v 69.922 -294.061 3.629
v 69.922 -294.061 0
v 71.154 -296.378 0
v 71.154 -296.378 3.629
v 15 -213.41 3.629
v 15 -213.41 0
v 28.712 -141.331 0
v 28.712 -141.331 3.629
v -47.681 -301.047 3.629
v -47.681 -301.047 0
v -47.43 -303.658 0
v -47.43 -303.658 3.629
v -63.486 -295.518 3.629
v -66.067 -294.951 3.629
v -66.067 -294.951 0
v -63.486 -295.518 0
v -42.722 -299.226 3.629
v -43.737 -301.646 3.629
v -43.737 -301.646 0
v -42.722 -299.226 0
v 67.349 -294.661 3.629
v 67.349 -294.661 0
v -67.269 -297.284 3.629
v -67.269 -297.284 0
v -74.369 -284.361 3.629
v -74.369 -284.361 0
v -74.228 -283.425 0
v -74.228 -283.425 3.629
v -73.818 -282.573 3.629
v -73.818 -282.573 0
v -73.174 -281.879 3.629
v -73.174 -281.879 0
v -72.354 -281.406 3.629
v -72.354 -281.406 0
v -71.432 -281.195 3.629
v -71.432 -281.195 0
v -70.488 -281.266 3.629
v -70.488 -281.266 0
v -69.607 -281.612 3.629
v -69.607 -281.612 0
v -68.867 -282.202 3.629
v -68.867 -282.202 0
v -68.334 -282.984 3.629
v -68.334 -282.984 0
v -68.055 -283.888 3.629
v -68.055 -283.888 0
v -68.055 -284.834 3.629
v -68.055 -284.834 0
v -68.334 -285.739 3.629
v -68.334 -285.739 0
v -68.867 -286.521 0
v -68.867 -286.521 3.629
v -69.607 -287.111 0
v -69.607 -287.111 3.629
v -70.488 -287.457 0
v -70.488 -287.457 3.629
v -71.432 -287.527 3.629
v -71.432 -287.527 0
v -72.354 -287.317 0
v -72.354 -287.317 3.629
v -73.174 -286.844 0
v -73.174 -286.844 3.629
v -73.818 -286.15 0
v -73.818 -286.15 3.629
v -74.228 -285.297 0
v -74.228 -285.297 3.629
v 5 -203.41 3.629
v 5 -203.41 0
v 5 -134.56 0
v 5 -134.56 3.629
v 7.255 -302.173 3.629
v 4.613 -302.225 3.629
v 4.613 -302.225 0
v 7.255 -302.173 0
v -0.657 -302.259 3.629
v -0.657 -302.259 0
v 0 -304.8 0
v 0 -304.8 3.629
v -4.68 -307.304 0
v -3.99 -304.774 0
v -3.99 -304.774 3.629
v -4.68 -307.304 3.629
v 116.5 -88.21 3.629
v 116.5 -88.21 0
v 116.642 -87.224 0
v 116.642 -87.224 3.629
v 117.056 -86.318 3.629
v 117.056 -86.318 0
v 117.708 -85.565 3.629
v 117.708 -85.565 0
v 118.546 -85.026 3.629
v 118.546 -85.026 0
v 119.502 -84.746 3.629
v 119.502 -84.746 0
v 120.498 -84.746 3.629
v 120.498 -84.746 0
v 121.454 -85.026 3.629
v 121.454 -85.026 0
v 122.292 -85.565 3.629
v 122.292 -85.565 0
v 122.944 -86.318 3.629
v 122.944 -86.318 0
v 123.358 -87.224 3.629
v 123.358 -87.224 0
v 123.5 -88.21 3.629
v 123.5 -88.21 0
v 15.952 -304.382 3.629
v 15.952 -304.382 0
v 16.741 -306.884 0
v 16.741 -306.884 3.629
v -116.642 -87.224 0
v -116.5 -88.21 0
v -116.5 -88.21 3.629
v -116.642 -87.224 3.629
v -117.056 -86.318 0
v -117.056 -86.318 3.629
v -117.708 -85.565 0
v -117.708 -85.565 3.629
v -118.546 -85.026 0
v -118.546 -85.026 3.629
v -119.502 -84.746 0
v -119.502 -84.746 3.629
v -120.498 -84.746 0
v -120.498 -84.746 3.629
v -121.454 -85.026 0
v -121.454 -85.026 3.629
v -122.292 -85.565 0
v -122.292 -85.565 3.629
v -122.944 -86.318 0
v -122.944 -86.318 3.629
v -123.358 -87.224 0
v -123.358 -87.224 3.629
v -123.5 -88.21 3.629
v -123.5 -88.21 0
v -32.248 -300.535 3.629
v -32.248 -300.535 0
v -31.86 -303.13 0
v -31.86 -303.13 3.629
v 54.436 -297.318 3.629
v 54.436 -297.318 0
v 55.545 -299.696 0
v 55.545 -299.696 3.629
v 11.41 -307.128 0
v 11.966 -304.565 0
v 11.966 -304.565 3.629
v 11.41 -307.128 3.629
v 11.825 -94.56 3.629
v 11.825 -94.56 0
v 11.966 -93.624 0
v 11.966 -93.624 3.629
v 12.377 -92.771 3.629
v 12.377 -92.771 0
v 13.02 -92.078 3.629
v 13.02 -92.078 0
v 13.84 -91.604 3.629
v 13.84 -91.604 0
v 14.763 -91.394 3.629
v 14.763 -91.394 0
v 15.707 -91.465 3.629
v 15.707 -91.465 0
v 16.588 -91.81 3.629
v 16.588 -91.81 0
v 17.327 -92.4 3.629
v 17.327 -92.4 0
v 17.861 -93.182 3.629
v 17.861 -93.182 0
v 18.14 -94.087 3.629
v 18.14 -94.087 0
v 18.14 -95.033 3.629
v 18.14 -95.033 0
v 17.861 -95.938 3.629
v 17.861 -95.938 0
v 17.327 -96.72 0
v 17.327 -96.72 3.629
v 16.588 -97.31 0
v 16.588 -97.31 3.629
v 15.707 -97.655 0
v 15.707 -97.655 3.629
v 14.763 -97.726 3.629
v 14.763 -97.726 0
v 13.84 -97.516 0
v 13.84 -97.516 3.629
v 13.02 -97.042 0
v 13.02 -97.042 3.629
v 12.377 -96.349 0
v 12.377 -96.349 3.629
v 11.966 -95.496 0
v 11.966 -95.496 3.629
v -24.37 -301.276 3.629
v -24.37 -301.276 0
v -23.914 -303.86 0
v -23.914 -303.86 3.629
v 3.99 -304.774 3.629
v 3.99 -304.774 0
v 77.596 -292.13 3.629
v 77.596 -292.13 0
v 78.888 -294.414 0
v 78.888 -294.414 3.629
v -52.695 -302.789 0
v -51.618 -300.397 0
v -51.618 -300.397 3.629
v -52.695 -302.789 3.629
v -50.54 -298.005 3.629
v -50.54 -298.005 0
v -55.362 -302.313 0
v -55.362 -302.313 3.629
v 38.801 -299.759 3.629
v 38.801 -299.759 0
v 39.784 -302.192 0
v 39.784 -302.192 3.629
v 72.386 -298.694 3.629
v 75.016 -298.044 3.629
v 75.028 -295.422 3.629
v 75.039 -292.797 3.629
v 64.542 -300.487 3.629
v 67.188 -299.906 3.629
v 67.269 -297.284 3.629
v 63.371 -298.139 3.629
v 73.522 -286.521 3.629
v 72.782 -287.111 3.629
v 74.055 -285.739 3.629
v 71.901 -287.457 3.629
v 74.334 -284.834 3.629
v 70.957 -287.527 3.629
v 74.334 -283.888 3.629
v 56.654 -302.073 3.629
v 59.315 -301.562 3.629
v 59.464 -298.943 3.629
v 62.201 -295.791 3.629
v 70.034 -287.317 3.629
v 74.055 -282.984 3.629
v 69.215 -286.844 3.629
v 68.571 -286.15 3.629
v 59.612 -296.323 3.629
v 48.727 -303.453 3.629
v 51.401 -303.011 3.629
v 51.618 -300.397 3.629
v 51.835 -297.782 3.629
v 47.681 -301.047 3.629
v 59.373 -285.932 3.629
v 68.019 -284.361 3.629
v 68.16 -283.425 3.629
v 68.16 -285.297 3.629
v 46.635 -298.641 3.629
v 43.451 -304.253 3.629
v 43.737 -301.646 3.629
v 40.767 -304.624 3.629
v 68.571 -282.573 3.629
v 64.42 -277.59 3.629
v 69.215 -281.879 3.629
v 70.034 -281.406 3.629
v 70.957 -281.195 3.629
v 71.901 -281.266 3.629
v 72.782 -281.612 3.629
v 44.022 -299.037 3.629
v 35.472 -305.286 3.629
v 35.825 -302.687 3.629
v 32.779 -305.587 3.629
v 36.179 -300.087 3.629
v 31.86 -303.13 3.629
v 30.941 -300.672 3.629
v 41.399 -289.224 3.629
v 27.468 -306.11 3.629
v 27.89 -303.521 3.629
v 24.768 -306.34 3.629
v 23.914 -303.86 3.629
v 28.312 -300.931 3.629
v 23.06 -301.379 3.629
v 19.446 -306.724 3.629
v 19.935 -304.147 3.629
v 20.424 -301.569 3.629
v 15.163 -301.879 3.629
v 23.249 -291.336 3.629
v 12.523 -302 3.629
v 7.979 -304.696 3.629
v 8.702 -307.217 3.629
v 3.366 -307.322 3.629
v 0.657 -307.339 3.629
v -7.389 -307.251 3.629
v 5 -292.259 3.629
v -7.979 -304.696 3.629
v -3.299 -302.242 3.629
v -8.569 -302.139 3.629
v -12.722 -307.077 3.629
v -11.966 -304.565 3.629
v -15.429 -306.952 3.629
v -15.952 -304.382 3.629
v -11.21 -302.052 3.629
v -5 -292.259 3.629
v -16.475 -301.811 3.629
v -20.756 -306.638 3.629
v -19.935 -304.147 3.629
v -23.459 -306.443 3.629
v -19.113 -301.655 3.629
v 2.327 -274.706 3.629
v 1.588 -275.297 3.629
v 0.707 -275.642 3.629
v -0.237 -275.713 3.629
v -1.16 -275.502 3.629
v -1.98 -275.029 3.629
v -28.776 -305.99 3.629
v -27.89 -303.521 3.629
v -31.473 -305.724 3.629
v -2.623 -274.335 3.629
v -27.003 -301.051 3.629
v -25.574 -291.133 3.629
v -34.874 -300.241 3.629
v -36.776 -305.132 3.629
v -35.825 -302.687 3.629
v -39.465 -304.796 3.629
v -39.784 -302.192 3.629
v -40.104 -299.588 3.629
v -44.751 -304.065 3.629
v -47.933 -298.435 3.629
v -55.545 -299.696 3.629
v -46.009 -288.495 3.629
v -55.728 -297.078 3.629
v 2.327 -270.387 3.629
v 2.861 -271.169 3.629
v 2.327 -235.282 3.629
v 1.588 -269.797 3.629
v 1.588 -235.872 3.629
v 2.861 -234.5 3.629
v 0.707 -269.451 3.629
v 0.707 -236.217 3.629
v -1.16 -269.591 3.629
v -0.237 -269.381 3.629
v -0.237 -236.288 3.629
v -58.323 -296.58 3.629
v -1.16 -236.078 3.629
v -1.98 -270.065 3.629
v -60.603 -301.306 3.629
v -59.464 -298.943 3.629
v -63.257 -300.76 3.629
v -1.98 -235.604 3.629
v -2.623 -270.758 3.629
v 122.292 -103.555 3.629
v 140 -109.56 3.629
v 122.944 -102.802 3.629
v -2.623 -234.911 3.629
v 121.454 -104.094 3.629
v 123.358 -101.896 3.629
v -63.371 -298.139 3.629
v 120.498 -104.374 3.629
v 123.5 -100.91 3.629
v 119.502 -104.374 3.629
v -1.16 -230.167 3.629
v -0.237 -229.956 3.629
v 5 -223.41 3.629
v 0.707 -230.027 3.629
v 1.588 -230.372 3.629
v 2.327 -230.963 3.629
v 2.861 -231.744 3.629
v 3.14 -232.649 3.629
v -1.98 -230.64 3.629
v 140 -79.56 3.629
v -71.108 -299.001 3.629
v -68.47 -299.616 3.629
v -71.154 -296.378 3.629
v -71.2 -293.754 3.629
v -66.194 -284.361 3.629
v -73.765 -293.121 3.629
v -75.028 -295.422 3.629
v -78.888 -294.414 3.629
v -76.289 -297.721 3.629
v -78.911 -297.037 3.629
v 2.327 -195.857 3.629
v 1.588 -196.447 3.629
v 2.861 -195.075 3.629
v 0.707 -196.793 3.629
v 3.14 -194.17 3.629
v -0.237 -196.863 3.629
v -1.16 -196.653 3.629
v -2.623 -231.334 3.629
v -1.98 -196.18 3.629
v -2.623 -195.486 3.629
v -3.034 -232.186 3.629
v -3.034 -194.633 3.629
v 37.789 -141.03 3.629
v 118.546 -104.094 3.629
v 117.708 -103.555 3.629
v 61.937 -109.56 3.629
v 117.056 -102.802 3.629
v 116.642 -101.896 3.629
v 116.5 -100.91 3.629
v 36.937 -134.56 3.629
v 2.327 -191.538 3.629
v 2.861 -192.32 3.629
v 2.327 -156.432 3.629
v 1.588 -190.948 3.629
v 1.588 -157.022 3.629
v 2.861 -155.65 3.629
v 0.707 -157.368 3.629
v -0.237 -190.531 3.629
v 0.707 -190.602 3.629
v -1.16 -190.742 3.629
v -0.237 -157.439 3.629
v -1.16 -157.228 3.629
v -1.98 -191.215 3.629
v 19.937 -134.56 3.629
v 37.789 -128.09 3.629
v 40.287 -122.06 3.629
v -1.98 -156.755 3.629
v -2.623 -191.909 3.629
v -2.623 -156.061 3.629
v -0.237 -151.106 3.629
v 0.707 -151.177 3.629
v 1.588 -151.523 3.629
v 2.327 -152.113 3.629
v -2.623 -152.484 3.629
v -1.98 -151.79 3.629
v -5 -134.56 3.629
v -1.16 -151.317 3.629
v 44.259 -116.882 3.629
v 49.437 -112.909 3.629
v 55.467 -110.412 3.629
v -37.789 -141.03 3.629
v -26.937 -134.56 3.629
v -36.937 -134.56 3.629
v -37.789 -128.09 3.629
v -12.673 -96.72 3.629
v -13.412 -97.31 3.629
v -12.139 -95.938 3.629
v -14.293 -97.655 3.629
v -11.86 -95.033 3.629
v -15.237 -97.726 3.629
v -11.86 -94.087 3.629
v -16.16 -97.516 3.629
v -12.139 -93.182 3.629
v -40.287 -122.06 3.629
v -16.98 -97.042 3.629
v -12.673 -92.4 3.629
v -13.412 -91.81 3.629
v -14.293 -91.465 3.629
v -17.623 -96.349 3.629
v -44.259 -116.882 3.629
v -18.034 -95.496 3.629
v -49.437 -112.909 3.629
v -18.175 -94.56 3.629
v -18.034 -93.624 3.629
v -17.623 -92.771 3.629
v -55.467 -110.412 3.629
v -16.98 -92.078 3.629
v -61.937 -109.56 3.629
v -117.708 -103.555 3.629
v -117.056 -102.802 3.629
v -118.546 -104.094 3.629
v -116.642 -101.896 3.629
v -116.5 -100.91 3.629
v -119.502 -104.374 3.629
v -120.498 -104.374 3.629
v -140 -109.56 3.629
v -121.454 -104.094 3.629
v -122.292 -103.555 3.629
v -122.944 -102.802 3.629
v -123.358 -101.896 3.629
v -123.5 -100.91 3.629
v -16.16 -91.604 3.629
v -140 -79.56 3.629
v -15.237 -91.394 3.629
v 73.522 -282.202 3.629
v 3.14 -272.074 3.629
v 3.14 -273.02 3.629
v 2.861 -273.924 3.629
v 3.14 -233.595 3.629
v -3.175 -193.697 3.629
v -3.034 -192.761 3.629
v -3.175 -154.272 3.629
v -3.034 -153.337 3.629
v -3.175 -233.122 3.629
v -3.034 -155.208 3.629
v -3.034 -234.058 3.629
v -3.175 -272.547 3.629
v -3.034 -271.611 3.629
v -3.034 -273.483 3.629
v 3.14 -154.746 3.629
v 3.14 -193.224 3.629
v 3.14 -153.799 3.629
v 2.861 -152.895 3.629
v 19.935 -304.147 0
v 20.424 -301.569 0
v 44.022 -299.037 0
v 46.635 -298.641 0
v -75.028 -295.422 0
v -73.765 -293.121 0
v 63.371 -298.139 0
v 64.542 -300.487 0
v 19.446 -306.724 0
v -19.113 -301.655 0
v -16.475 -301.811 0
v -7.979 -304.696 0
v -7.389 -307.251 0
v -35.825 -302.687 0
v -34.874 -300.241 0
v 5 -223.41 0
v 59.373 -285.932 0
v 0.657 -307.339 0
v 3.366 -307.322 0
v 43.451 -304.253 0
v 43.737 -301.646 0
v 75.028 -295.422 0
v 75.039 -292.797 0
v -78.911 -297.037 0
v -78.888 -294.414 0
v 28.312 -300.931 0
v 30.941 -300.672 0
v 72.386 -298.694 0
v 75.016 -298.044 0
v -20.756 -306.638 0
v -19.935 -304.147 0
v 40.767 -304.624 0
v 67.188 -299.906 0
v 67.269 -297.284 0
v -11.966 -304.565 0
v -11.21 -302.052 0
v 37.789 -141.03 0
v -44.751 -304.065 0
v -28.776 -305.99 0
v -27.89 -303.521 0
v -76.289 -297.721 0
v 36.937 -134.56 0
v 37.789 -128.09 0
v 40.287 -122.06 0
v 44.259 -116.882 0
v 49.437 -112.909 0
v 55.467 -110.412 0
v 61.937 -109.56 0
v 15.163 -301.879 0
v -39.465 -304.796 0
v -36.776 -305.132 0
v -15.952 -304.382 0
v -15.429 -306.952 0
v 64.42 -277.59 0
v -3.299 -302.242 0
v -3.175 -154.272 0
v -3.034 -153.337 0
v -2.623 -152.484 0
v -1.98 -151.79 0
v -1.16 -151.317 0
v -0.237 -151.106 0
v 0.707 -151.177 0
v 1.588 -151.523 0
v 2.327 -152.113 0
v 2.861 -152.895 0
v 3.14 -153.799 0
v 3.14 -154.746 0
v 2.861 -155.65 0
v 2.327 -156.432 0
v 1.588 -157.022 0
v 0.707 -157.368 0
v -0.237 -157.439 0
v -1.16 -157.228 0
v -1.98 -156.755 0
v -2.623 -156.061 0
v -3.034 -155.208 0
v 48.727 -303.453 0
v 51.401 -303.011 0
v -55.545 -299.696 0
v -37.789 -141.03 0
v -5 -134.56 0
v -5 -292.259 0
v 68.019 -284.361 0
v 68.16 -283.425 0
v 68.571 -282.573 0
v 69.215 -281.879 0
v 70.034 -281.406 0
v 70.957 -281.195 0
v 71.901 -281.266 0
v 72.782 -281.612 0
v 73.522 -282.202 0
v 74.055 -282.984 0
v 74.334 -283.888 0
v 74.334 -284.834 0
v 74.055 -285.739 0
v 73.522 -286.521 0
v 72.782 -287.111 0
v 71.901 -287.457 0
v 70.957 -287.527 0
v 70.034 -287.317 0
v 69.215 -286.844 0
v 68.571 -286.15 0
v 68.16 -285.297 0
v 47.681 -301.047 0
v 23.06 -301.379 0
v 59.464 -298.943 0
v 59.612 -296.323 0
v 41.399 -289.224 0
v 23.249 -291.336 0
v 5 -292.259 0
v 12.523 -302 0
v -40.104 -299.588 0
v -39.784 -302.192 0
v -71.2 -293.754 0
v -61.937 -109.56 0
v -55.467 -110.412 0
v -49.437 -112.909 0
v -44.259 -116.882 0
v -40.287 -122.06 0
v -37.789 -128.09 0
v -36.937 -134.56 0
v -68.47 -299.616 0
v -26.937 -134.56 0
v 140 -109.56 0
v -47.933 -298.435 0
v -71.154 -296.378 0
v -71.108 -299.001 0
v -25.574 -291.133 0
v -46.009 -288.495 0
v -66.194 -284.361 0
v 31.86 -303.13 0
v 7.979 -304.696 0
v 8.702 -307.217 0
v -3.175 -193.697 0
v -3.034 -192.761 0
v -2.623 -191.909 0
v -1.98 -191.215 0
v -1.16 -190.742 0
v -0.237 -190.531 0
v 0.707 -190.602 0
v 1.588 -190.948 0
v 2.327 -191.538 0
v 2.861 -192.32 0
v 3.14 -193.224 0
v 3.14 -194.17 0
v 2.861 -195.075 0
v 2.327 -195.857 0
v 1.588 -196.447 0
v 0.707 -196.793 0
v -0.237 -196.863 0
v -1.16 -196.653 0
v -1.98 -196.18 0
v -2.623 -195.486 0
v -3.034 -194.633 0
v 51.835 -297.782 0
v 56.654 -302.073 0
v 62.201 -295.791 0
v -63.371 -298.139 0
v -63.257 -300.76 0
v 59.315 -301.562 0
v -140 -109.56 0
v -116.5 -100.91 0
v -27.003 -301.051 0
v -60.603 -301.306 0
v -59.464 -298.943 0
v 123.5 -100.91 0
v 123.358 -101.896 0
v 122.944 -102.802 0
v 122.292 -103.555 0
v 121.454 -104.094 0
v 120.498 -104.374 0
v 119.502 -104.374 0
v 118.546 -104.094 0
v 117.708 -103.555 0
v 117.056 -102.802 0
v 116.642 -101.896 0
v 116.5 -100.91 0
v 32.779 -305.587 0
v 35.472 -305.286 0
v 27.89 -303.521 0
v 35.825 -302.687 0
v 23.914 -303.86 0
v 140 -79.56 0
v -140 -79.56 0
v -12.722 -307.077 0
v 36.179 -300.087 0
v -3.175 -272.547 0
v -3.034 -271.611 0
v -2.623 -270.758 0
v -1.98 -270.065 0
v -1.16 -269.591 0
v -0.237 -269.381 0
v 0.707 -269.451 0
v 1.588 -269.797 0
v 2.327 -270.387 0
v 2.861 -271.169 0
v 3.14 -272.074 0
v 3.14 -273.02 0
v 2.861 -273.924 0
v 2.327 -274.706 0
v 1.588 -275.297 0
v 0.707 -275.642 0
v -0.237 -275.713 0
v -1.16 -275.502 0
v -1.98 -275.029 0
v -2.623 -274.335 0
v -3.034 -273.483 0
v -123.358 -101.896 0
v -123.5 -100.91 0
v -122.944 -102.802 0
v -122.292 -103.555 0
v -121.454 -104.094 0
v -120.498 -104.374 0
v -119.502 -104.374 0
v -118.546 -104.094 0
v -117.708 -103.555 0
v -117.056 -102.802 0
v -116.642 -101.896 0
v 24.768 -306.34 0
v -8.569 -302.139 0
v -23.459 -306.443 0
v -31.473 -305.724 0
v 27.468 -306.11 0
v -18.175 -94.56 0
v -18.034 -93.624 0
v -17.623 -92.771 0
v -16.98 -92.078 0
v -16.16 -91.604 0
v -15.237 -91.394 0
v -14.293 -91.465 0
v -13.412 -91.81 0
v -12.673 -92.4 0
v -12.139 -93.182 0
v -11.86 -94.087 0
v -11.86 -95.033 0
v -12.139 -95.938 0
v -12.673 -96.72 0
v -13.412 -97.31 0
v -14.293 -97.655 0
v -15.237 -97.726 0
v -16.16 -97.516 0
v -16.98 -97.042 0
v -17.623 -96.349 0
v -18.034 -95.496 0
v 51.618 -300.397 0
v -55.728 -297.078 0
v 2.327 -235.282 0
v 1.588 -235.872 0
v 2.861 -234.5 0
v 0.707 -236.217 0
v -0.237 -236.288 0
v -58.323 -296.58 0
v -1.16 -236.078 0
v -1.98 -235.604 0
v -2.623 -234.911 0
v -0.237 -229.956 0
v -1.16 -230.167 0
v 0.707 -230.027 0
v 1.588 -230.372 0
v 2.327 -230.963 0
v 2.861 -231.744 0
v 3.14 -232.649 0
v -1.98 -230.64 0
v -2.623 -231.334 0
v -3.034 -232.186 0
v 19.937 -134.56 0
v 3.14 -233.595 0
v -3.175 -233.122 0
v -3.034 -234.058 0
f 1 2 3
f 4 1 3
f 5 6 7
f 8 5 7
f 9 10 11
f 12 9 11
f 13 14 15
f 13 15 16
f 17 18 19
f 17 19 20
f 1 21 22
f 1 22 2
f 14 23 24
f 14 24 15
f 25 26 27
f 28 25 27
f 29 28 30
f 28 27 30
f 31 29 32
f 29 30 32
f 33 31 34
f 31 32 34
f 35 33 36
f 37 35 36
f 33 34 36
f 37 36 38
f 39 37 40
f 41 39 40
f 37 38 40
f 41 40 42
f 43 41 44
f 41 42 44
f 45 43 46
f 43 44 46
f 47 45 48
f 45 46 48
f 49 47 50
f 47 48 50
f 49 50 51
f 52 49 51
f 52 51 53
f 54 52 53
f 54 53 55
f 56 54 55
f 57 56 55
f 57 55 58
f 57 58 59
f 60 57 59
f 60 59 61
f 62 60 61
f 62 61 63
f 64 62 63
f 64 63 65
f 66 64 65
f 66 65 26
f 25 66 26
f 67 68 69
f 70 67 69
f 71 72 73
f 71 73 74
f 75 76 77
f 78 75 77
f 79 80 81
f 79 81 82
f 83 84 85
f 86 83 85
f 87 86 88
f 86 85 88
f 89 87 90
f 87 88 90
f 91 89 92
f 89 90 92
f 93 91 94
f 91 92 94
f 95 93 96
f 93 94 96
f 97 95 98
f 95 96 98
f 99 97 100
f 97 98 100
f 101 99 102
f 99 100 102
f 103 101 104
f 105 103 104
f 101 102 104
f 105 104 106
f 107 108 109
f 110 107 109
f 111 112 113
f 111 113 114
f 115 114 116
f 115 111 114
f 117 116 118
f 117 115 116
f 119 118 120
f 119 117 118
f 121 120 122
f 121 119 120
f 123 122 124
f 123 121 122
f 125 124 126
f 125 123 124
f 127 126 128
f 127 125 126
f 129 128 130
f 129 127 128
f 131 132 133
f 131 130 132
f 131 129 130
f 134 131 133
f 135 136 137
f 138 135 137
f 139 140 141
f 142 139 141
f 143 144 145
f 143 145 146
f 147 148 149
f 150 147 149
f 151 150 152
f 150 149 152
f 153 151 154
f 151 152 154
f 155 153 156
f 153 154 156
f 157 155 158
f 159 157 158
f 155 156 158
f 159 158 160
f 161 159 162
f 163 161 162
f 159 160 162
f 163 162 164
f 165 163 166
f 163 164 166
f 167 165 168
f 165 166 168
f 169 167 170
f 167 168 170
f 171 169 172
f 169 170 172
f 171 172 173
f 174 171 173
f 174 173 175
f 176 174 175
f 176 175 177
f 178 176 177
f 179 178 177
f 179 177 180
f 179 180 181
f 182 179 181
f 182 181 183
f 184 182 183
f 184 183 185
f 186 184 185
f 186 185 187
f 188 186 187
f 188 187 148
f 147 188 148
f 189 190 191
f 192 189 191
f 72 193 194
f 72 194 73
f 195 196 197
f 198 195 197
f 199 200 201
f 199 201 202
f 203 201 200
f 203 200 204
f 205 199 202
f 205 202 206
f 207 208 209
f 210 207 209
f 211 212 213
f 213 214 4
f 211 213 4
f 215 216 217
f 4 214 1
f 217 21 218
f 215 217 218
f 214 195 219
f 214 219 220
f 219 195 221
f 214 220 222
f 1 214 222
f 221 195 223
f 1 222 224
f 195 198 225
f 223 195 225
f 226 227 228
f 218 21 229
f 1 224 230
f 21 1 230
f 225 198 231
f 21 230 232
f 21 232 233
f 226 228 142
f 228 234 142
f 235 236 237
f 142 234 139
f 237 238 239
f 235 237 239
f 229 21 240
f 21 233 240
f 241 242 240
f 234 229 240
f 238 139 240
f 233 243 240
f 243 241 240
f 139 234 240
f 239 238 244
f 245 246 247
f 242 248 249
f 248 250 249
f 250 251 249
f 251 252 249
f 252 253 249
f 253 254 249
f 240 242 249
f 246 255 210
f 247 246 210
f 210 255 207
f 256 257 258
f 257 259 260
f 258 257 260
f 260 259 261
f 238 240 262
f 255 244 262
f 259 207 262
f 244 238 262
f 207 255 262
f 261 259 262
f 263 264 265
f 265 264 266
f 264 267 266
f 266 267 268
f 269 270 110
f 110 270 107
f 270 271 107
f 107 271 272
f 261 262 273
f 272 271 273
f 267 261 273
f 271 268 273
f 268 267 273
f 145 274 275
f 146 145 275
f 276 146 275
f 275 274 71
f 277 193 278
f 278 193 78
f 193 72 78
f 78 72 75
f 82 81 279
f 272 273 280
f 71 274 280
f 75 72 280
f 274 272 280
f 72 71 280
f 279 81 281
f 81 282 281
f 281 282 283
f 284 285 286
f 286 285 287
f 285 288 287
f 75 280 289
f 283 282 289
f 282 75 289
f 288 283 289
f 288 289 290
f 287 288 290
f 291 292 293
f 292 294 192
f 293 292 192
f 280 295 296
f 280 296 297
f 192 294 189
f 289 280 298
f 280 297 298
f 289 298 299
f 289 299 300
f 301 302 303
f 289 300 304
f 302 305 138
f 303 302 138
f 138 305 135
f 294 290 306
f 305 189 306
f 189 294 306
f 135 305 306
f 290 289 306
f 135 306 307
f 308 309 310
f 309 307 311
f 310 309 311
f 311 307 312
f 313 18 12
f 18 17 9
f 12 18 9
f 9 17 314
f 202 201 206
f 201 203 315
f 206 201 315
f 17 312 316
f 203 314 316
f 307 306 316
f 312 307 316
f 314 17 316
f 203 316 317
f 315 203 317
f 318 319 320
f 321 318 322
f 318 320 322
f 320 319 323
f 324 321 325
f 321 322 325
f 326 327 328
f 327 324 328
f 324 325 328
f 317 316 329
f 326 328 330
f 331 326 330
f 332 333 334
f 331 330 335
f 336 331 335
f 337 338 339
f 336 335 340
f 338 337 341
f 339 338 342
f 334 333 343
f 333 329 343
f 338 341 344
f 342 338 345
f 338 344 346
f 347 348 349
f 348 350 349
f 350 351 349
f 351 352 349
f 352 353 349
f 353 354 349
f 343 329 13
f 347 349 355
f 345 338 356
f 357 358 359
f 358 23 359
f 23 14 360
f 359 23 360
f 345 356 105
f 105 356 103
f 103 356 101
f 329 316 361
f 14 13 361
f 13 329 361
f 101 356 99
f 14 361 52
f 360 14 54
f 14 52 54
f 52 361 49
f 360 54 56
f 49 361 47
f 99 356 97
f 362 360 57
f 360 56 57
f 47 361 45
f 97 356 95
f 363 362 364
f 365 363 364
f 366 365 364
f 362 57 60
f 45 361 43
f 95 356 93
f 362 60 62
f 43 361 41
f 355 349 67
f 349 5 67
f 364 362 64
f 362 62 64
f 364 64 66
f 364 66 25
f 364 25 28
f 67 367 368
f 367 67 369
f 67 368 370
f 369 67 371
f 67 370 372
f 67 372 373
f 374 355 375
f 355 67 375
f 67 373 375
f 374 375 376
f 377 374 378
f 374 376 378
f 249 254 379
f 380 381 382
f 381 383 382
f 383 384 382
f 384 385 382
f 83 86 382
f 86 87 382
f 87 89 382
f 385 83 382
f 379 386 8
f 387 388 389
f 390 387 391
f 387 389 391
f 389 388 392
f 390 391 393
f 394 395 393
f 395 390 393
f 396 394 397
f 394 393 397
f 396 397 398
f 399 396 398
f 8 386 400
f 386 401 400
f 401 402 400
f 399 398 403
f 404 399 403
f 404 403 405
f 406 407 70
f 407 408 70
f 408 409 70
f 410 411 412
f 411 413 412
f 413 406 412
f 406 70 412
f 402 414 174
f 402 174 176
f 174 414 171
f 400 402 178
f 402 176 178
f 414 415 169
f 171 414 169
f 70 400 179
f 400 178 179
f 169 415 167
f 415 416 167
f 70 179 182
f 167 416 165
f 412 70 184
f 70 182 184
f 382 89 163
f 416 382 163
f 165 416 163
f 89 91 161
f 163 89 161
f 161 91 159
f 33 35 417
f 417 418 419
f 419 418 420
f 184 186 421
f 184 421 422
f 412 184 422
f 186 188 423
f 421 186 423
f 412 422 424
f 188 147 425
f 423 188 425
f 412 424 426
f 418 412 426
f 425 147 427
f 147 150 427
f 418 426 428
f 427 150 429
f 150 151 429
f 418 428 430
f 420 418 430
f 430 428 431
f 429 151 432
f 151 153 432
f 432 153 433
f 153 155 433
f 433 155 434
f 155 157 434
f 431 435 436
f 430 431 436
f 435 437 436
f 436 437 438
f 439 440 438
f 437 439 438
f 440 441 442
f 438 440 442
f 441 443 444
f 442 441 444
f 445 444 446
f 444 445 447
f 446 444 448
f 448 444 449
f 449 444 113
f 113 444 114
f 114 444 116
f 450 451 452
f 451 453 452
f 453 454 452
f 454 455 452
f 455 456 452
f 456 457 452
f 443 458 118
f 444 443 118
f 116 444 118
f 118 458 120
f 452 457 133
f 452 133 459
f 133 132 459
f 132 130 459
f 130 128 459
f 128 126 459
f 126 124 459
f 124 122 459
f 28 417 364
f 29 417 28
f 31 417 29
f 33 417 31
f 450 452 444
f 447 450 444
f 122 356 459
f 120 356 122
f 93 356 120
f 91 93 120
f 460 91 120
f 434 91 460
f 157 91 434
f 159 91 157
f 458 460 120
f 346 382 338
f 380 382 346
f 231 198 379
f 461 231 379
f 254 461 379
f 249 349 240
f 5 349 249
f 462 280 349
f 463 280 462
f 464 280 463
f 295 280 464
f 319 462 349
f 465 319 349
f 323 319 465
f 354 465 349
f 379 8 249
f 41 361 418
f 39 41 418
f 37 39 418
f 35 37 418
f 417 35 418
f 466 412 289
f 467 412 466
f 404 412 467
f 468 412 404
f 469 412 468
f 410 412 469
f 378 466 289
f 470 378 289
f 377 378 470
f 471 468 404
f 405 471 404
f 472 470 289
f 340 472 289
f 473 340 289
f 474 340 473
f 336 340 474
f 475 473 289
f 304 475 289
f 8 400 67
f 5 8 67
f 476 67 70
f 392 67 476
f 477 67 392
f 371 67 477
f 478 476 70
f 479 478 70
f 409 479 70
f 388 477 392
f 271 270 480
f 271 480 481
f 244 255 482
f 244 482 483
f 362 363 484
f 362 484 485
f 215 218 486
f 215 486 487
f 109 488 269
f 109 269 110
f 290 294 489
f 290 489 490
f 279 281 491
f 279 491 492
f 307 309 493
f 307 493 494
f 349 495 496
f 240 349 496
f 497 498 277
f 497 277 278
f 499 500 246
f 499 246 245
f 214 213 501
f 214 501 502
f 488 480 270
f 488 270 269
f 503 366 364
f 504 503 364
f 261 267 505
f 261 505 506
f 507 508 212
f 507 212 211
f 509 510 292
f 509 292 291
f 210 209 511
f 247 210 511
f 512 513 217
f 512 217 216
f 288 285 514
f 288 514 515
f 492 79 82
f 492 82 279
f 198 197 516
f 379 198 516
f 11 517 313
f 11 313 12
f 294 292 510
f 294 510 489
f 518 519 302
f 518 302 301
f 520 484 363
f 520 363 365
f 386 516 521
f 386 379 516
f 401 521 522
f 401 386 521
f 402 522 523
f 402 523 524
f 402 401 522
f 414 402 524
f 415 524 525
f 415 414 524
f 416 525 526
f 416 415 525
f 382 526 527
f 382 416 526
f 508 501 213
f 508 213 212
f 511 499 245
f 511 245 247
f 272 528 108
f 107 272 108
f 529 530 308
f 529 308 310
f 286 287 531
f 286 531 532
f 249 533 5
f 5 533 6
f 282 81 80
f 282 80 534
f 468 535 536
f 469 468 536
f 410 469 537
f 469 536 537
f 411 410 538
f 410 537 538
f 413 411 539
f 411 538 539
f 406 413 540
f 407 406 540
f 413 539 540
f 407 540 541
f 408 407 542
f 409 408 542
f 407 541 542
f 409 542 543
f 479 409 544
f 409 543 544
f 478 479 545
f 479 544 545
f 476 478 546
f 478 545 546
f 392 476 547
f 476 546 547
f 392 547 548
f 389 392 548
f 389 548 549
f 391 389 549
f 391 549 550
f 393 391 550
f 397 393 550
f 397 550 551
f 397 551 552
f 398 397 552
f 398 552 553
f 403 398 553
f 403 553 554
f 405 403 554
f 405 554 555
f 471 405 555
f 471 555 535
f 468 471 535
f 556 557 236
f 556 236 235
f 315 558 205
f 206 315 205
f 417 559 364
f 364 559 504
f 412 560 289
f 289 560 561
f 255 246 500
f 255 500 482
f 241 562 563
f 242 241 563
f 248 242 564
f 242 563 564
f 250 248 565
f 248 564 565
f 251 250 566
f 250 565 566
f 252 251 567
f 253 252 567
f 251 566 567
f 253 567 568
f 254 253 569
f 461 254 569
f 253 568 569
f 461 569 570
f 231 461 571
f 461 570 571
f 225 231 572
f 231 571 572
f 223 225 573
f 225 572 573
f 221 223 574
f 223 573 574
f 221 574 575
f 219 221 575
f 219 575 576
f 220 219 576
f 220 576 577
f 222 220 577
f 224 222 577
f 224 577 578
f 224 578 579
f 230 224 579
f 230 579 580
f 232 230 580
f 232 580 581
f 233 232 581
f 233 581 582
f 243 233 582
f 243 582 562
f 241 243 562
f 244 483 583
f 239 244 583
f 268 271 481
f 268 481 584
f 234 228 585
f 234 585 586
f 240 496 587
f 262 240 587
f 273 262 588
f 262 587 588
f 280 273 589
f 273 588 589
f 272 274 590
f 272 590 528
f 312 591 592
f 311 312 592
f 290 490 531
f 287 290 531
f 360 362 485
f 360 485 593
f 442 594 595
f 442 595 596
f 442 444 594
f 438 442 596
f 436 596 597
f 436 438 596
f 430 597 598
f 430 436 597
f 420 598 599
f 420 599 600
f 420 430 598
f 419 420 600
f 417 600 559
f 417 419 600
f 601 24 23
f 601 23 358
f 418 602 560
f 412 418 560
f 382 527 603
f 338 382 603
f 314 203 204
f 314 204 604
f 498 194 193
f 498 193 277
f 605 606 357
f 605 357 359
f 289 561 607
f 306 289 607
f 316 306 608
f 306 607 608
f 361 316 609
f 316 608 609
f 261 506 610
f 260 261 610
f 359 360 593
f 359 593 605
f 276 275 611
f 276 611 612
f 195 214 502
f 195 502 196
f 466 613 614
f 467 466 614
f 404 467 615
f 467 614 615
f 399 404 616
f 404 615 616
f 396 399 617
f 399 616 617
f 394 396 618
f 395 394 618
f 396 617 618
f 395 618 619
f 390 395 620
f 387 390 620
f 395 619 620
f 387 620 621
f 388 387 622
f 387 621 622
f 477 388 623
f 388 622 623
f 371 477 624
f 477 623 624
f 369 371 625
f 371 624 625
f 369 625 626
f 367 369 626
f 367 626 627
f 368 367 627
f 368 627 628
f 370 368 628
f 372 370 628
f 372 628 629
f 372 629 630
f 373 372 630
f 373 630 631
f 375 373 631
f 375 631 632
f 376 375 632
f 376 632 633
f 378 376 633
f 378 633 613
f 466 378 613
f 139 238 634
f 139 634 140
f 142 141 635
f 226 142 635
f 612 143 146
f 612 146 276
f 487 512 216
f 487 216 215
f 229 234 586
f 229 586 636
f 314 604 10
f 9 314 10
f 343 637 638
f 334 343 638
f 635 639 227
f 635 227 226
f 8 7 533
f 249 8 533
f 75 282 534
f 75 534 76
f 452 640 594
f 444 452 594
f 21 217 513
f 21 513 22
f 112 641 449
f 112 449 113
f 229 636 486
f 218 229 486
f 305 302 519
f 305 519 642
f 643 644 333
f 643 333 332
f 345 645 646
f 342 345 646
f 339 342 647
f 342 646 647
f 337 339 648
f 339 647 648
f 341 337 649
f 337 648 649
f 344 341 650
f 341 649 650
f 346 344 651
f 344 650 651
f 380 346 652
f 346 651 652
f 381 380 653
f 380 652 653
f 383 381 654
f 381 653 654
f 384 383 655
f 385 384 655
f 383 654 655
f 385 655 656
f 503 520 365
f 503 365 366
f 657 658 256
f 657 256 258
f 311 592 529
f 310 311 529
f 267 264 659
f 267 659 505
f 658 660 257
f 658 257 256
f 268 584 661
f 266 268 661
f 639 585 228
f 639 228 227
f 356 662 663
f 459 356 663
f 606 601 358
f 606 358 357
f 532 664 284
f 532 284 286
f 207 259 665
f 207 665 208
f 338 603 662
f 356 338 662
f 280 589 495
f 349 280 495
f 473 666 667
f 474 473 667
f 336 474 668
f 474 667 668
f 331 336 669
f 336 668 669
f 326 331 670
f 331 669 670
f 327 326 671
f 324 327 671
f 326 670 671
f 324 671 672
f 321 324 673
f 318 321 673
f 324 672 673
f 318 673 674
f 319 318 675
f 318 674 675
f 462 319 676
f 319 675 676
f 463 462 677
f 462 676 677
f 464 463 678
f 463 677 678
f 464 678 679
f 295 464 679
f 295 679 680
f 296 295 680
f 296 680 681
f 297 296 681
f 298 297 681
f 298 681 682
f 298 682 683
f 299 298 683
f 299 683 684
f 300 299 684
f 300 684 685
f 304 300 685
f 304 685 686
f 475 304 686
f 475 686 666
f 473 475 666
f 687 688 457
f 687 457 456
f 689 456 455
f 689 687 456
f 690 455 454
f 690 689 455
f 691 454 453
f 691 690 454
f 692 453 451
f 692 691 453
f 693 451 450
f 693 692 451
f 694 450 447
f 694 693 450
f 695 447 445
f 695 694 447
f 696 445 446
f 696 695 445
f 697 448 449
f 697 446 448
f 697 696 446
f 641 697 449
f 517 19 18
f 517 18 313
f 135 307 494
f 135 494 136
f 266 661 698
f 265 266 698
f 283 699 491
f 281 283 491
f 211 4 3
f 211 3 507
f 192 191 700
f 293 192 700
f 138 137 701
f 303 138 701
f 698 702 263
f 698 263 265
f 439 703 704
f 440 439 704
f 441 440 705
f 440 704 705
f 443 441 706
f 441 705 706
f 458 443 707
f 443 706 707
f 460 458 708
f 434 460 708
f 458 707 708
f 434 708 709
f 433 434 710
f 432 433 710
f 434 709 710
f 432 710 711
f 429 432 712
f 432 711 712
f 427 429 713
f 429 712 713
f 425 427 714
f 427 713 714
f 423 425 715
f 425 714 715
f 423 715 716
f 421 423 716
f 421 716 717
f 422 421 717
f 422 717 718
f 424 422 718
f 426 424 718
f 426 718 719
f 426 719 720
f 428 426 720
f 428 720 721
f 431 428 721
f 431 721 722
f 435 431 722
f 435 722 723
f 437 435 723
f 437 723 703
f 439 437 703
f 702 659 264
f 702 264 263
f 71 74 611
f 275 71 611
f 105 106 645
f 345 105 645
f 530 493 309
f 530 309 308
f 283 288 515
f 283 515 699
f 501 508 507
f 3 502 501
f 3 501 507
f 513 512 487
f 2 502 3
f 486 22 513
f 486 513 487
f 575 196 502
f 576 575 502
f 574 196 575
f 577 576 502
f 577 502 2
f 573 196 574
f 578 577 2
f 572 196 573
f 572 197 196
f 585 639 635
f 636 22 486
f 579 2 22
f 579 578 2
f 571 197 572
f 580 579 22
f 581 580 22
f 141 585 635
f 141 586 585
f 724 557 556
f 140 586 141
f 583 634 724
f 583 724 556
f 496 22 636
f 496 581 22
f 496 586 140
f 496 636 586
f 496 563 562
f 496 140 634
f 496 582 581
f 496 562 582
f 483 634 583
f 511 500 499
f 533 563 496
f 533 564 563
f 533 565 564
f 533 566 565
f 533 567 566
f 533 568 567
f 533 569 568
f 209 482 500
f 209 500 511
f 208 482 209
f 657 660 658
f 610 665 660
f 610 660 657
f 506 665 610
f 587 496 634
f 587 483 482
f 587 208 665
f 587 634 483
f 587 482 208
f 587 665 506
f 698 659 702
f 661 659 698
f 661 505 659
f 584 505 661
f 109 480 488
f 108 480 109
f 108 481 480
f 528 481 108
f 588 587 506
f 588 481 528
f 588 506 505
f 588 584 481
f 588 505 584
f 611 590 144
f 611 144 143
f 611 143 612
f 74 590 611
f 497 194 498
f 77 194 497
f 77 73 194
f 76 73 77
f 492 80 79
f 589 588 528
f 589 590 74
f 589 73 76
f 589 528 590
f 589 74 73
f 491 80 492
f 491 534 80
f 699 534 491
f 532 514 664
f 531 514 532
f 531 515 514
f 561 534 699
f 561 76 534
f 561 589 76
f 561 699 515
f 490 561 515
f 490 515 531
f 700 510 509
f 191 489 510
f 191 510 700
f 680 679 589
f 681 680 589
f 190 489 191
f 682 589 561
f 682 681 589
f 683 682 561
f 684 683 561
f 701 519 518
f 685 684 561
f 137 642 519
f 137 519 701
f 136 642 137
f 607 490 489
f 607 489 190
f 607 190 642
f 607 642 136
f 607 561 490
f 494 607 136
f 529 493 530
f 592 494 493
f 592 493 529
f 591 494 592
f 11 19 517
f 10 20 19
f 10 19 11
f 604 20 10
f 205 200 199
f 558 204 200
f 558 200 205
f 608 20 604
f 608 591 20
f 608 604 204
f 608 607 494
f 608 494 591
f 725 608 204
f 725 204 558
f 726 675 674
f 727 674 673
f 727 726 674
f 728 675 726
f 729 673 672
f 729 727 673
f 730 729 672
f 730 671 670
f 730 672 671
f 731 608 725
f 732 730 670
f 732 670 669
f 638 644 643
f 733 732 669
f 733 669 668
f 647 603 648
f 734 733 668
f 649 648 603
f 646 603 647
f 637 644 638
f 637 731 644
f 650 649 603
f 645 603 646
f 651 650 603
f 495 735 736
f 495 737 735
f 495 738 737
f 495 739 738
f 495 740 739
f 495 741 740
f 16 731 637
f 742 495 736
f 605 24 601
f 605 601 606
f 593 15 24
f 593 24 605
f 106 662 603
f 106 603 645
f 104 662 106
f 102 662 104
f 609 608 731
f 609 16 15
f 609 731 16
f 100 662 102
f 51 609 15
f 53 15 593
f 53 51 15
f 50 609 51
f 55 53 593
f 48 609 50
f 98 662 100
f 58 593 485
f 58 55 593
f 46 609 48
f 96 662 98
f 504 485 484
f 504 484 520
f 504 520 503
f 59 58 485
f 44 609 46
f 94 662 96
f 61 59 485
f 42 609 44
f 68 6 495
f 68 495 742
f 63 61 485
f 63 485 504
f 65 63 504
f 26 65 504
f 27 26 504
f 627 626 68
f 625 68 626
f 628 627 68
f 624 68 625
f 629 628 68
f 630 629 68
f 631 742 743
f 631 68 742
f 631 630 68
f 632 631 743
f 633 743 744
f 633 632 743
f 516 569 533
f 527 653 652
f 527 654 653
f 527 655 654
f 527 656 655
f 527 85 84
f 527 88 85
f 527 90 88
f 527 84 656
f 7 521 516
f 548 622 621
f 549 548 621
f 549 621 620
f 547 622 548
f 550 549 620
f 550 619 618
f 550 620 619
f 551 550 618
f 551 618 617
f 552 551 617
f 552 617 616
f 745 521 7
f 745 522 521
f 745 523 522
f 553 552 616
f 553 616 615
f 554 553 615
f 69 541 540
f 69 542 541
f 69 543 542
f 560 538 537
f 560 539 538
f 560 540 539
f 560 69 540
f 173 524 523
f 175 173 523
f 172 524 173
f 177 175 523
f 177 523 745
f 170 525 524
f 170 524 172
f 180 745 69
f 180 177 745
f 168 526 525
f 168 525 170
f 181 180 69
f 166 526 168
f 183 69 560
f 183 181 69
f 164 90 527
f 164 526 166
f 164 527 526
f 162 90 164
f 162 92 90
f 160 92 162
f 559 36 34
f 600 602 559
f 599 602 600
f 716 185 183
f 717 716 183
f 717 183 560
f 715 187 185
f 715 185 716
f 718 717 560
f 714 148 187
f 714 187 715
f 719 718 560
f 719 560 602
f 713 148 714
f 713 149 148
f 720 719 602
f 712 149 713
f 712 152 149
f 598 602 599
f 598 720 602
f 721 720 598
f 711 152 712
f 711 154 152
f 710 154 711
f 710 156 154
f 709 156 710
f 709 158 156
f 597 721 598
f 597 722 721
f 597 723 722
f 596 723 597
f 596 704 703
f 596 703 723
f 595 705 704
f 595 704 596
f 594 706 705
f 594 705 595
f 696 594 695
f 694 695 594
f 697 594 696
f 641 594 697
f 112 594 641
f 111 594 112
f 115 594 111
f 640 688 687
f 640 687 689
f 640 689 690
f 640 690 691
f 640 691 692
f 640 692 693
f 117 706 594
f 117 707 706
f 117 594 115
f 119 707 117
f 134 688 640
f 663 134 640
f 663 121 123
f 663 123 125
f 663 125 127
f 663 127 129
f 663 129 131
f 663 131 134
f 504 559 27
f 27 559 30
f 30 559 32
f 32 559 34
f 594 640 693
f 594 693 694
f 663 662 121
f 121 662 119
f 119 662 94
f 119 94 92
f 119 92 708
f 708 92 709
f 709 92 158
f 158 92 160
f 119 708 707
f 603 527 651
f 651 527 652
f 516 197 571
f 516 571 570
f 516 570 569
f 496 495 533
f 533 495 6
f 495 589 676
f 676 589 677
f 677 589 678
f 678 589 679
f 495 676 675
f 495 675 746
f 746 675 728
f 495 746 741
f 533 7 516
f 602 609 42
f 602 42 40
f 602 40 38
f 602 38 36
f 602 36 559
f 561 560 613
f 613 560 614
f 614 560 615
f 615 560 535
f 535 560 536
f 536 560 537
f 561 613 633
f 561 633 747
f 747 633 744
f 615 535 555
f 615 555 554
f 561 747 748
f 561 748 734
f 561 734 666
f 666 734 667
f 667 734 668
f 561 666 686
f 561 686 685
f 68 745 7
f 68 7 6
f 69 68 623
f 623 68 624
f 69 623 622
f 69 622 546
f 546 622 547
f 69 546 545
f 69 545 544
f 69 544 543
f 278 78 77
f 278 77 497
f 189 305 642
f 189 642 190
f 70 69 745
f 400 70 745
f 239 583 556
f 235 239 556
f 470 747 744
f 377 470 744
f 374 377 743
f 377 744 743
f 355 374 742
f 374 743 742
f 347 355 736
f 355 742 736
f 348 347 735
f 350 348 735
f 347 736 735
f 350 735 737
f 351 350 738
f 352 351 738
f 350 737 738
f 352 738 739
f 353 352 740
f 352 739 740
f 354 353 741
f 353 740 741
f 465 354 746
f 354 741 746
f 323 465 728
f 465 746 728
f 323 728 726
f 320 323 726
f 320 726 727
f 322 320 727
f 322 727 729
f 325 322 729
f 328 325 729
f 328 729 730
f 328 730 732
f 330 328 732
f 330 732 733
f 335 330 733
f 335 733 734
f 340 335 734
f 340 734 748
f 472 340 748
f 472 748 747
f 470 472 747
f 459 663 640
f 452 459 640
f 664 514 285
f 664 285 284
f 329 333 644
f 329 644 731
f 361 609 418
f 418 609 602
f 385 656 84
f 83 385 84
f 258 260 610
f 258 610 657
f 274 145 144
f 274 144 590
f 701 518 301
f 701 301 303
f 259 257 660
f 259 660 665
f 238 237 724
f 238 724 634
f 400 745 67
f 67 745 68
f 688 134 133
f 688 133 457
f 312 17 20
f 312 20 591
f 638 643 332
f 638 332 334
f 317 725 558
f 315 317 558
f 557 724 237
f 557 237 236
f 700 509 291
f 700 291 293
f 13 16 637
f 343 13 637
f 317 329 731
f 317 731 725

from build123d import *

# Parameters (mm, degrees)
BOSS_EXTRUDE2_DEPTH = 3.628571429
FILLET1_R           = 25
BOSS_EXTRUDE4_DEPTH = 3.628571429
CUT_EXTRUDE2_DEPTH  = 336.434355024
CIRPATTERN8_COUNT   = 20
CIRPATTERN8_ANGLE   = 28.5
SKETCH5_R           = 3.175
CUT_EXTRUDE3_DEPTH  = 338.743409804
SKETCH17_R          = 3.175
CUT_EXTRUDE4_DEPTH  = 338.743409804


with BuildPart() as part:
    # Sketch3 → Boss-Extrude2 (new body)
    with BuildSketch(Plane.XY):
        with BuildLine():
            Line((-140, -79.56), (-140, -109.56))
            Line((-140, -109.56), (-29.356513523, -109.56))
            Line((-29.356513523, -109.56), (-78.888044947, -294.414191853))
            ThreePointArc((-78.888044947, -294.414191853), (0, -304.8), (78.888044947, -294.414191853))
            Line((78.888044947, -294.414191853), (29.356513523, -109.56))
            Line((29.356513523, -109.56), (140, -109.56))
            Line((140, -109.56), (140, -79.56))
            Line((140, -79.56), (-140, -79.56))
        make_face()
    extrude(amount=BOSS_EXTRUDE2_DEPTH)

    # Fillet1
    fillet1_edges = [part.edges().sort_by_distance(p)[0] for p in [
        (29.356513523, -109.56, 1.814285714),
        (-29.356513523, -109.56, 1.814285714),
    ]]
    fillet(fillet1_edges, radius=FILLET1_R)

    # Sketch14 → Boss-Extrude4 (add)
    with BuildSketch(Plane(origin=(0, 0, 0), x_dir=(-1, 0, 0), z_dir=(0, 0, -1))):
        with BuildLine():
            Line((78.910933272, -297.036934084), (78.888044947, -294.414191853))
            ThreePointArc((78.888044947, -294.414191853), (76.959432674, -294.924203351), (75.027523715, -295.421581279))
            Line((75.027523715, -295.421581279), (76.289081309, -297.721097125))
            Line((76.289081309, -297.721097125), (78.910933272, -297.036934084))
        make_face()
    boss_extrude4 = extrude(amount=-BOSS_EXTRUDE4_DEPTH)

    # Sketch16 → Cut-Extrude2 (cut, symmetric)
    with BuildSketch(Plane(origin=(0, 0, 0), x_dir=(-1, 0, 0), z_dir=(0, 0, -1))):
        Polygon((372.937709596, -838.440145613), (75.027523715, -295.421581279), (73.765262731, -293.12078332), (71.19993834, -293.754449124), (71.154137831, -296.378353915), (60.344615656, -915.654378233), (357.400151379, -2118.250141136), (669.993245319, -2041.035908516), align=None)
    cut_extrude2 = extrude(amount=CUT_EXTRUDE2_DEPTH, both=True, mode=Mode.SUBTRACT)

    # CirPattern8: Boss-Extrude4, Cut-Extrude2 ×20 about axis
    cirpattern8_axis = Axis((0, 0, 0), (0, 0, 1))
    add([boss_extrude4.rotate(cirpattern8_axis, i * CIRPATTERN8_ANGLE / (CIRPATTERN8_COUNT - 1)) for i in range(1, CIRPATTERN8_COUNT)])
    add([cut_extrude2.rotate(cirpattern8_axis, i * CIRPATTERN8_ANGLE / (CIRPATTERN8_COUNT - 1)) for i in range(1, CIRPATTERN8_COUNT)], mode=Mode.SUBTRACT)

    # Sketch5 → Cut-Extrude3 (cut, through all)
    with BuildSketch(Plane(origin=(0, 0, 0), x_dir=(-1, 0, 0), z_dir=(0, 0, -1))):
        with Locations((-15, -94.56)):
            Circle(SKETCH5_R)
        with Locations((15, -94.56)):
            Circle(SKETCH5_R)
        with BuildLine():
            Line((-123.5, -94.56), (-123.5, -100.91))
            ThreePointArc((-123.5, -100.91), (-120, -104.41), (-116.5, -100.91))
            Line((-116.5, -100.91), (-116.5, -94.56))
            Line((-116.5, -94.56), (-116.5, -88.21))
            ThreePointArc((-116.5, -88.21), (-120, -84.71), (-123.5, -88.21))
            Line((-123.5, -88.21), (-123.5, -94.56))
        make_face()
        with BuildLine():
            Line((116.5, -94.56), (116.5, -88.21))
            ThreePointArc((116.5, -88.21), (120, -84.71), (123.5, -88.21))
            Line((123.5, -88.21), (123.5, -94.56))
            Line((123.5, -94.56), (123.5, -100.91))
            ThreePointArc((123.5, -100.91), (120, -104.41), (116.5, -100.91))
            Line((116.5, -100.91), (116.5, -94.56))
        make_face()
    extrude(amount=-CUT_EXTRUDE3_DEPTH, mode=Mode.SUBTRACT)

    # Sketch17 → Cut-Extrude4 (cut, through all)
    with BuildSketch(Plane(origin=(0, 0, 0), x_dir=(-1, 0, 0), z_dir=(0, 0, -1))):
        with BuildLine():
            Line((66.194365296, -284.361242536), (26.937147844, -134.56))
            Line((26.937147844, -134.56), (5, -134.56))
            Line((5, -134.56), (5, -292.259285824))
            ThreePointArc((5, -292.259285824), (35.815557854, -290.00224429), (66.194365296, -284.361242536))
        make_face()
        Polygon((-28.711660115, -141.33134449), (-64.419853025, -277.589898046), (-15, -213.409642912), align=None)
        with BuildLine():
            Line((-5, -223.409642912), (-59.372890863, -285.932066063))
            ThreePointArc((-59.372890863, -285.932066063), (-32.341547535, -290.428544105), (-5, -292.259285824))
            Line((-5, -292.259285824), (-5, -223.409642912))
        make_face()
        Polygon((-19.937147844, -134.56), (-5, -203.409642912), (-5, -134.56), align=None)
        with Locations((0, -272.546875096)):
            Circle(SKETCH17_R)
        with Locations((0, -233.12205364)):
            Circle(SKETCH17_R)
        with Locations((0, -193.697232184)):
            Circle(SKETCH17_R)
        with Locations((0, -154.272410728)):
            Circle(SKETCH17_R)
        with Locations((-71.194365296, -284.361242536)):
            Circle(SKETCH17_R)
        with Locations((71.194365296, -284.361242536)):
            Circle(SKETCH17_R)
    extrude(amount=-CUT_EXTRUDE4_DEPTH, mode=Mode.SUBTRACT)


solid = part.part
